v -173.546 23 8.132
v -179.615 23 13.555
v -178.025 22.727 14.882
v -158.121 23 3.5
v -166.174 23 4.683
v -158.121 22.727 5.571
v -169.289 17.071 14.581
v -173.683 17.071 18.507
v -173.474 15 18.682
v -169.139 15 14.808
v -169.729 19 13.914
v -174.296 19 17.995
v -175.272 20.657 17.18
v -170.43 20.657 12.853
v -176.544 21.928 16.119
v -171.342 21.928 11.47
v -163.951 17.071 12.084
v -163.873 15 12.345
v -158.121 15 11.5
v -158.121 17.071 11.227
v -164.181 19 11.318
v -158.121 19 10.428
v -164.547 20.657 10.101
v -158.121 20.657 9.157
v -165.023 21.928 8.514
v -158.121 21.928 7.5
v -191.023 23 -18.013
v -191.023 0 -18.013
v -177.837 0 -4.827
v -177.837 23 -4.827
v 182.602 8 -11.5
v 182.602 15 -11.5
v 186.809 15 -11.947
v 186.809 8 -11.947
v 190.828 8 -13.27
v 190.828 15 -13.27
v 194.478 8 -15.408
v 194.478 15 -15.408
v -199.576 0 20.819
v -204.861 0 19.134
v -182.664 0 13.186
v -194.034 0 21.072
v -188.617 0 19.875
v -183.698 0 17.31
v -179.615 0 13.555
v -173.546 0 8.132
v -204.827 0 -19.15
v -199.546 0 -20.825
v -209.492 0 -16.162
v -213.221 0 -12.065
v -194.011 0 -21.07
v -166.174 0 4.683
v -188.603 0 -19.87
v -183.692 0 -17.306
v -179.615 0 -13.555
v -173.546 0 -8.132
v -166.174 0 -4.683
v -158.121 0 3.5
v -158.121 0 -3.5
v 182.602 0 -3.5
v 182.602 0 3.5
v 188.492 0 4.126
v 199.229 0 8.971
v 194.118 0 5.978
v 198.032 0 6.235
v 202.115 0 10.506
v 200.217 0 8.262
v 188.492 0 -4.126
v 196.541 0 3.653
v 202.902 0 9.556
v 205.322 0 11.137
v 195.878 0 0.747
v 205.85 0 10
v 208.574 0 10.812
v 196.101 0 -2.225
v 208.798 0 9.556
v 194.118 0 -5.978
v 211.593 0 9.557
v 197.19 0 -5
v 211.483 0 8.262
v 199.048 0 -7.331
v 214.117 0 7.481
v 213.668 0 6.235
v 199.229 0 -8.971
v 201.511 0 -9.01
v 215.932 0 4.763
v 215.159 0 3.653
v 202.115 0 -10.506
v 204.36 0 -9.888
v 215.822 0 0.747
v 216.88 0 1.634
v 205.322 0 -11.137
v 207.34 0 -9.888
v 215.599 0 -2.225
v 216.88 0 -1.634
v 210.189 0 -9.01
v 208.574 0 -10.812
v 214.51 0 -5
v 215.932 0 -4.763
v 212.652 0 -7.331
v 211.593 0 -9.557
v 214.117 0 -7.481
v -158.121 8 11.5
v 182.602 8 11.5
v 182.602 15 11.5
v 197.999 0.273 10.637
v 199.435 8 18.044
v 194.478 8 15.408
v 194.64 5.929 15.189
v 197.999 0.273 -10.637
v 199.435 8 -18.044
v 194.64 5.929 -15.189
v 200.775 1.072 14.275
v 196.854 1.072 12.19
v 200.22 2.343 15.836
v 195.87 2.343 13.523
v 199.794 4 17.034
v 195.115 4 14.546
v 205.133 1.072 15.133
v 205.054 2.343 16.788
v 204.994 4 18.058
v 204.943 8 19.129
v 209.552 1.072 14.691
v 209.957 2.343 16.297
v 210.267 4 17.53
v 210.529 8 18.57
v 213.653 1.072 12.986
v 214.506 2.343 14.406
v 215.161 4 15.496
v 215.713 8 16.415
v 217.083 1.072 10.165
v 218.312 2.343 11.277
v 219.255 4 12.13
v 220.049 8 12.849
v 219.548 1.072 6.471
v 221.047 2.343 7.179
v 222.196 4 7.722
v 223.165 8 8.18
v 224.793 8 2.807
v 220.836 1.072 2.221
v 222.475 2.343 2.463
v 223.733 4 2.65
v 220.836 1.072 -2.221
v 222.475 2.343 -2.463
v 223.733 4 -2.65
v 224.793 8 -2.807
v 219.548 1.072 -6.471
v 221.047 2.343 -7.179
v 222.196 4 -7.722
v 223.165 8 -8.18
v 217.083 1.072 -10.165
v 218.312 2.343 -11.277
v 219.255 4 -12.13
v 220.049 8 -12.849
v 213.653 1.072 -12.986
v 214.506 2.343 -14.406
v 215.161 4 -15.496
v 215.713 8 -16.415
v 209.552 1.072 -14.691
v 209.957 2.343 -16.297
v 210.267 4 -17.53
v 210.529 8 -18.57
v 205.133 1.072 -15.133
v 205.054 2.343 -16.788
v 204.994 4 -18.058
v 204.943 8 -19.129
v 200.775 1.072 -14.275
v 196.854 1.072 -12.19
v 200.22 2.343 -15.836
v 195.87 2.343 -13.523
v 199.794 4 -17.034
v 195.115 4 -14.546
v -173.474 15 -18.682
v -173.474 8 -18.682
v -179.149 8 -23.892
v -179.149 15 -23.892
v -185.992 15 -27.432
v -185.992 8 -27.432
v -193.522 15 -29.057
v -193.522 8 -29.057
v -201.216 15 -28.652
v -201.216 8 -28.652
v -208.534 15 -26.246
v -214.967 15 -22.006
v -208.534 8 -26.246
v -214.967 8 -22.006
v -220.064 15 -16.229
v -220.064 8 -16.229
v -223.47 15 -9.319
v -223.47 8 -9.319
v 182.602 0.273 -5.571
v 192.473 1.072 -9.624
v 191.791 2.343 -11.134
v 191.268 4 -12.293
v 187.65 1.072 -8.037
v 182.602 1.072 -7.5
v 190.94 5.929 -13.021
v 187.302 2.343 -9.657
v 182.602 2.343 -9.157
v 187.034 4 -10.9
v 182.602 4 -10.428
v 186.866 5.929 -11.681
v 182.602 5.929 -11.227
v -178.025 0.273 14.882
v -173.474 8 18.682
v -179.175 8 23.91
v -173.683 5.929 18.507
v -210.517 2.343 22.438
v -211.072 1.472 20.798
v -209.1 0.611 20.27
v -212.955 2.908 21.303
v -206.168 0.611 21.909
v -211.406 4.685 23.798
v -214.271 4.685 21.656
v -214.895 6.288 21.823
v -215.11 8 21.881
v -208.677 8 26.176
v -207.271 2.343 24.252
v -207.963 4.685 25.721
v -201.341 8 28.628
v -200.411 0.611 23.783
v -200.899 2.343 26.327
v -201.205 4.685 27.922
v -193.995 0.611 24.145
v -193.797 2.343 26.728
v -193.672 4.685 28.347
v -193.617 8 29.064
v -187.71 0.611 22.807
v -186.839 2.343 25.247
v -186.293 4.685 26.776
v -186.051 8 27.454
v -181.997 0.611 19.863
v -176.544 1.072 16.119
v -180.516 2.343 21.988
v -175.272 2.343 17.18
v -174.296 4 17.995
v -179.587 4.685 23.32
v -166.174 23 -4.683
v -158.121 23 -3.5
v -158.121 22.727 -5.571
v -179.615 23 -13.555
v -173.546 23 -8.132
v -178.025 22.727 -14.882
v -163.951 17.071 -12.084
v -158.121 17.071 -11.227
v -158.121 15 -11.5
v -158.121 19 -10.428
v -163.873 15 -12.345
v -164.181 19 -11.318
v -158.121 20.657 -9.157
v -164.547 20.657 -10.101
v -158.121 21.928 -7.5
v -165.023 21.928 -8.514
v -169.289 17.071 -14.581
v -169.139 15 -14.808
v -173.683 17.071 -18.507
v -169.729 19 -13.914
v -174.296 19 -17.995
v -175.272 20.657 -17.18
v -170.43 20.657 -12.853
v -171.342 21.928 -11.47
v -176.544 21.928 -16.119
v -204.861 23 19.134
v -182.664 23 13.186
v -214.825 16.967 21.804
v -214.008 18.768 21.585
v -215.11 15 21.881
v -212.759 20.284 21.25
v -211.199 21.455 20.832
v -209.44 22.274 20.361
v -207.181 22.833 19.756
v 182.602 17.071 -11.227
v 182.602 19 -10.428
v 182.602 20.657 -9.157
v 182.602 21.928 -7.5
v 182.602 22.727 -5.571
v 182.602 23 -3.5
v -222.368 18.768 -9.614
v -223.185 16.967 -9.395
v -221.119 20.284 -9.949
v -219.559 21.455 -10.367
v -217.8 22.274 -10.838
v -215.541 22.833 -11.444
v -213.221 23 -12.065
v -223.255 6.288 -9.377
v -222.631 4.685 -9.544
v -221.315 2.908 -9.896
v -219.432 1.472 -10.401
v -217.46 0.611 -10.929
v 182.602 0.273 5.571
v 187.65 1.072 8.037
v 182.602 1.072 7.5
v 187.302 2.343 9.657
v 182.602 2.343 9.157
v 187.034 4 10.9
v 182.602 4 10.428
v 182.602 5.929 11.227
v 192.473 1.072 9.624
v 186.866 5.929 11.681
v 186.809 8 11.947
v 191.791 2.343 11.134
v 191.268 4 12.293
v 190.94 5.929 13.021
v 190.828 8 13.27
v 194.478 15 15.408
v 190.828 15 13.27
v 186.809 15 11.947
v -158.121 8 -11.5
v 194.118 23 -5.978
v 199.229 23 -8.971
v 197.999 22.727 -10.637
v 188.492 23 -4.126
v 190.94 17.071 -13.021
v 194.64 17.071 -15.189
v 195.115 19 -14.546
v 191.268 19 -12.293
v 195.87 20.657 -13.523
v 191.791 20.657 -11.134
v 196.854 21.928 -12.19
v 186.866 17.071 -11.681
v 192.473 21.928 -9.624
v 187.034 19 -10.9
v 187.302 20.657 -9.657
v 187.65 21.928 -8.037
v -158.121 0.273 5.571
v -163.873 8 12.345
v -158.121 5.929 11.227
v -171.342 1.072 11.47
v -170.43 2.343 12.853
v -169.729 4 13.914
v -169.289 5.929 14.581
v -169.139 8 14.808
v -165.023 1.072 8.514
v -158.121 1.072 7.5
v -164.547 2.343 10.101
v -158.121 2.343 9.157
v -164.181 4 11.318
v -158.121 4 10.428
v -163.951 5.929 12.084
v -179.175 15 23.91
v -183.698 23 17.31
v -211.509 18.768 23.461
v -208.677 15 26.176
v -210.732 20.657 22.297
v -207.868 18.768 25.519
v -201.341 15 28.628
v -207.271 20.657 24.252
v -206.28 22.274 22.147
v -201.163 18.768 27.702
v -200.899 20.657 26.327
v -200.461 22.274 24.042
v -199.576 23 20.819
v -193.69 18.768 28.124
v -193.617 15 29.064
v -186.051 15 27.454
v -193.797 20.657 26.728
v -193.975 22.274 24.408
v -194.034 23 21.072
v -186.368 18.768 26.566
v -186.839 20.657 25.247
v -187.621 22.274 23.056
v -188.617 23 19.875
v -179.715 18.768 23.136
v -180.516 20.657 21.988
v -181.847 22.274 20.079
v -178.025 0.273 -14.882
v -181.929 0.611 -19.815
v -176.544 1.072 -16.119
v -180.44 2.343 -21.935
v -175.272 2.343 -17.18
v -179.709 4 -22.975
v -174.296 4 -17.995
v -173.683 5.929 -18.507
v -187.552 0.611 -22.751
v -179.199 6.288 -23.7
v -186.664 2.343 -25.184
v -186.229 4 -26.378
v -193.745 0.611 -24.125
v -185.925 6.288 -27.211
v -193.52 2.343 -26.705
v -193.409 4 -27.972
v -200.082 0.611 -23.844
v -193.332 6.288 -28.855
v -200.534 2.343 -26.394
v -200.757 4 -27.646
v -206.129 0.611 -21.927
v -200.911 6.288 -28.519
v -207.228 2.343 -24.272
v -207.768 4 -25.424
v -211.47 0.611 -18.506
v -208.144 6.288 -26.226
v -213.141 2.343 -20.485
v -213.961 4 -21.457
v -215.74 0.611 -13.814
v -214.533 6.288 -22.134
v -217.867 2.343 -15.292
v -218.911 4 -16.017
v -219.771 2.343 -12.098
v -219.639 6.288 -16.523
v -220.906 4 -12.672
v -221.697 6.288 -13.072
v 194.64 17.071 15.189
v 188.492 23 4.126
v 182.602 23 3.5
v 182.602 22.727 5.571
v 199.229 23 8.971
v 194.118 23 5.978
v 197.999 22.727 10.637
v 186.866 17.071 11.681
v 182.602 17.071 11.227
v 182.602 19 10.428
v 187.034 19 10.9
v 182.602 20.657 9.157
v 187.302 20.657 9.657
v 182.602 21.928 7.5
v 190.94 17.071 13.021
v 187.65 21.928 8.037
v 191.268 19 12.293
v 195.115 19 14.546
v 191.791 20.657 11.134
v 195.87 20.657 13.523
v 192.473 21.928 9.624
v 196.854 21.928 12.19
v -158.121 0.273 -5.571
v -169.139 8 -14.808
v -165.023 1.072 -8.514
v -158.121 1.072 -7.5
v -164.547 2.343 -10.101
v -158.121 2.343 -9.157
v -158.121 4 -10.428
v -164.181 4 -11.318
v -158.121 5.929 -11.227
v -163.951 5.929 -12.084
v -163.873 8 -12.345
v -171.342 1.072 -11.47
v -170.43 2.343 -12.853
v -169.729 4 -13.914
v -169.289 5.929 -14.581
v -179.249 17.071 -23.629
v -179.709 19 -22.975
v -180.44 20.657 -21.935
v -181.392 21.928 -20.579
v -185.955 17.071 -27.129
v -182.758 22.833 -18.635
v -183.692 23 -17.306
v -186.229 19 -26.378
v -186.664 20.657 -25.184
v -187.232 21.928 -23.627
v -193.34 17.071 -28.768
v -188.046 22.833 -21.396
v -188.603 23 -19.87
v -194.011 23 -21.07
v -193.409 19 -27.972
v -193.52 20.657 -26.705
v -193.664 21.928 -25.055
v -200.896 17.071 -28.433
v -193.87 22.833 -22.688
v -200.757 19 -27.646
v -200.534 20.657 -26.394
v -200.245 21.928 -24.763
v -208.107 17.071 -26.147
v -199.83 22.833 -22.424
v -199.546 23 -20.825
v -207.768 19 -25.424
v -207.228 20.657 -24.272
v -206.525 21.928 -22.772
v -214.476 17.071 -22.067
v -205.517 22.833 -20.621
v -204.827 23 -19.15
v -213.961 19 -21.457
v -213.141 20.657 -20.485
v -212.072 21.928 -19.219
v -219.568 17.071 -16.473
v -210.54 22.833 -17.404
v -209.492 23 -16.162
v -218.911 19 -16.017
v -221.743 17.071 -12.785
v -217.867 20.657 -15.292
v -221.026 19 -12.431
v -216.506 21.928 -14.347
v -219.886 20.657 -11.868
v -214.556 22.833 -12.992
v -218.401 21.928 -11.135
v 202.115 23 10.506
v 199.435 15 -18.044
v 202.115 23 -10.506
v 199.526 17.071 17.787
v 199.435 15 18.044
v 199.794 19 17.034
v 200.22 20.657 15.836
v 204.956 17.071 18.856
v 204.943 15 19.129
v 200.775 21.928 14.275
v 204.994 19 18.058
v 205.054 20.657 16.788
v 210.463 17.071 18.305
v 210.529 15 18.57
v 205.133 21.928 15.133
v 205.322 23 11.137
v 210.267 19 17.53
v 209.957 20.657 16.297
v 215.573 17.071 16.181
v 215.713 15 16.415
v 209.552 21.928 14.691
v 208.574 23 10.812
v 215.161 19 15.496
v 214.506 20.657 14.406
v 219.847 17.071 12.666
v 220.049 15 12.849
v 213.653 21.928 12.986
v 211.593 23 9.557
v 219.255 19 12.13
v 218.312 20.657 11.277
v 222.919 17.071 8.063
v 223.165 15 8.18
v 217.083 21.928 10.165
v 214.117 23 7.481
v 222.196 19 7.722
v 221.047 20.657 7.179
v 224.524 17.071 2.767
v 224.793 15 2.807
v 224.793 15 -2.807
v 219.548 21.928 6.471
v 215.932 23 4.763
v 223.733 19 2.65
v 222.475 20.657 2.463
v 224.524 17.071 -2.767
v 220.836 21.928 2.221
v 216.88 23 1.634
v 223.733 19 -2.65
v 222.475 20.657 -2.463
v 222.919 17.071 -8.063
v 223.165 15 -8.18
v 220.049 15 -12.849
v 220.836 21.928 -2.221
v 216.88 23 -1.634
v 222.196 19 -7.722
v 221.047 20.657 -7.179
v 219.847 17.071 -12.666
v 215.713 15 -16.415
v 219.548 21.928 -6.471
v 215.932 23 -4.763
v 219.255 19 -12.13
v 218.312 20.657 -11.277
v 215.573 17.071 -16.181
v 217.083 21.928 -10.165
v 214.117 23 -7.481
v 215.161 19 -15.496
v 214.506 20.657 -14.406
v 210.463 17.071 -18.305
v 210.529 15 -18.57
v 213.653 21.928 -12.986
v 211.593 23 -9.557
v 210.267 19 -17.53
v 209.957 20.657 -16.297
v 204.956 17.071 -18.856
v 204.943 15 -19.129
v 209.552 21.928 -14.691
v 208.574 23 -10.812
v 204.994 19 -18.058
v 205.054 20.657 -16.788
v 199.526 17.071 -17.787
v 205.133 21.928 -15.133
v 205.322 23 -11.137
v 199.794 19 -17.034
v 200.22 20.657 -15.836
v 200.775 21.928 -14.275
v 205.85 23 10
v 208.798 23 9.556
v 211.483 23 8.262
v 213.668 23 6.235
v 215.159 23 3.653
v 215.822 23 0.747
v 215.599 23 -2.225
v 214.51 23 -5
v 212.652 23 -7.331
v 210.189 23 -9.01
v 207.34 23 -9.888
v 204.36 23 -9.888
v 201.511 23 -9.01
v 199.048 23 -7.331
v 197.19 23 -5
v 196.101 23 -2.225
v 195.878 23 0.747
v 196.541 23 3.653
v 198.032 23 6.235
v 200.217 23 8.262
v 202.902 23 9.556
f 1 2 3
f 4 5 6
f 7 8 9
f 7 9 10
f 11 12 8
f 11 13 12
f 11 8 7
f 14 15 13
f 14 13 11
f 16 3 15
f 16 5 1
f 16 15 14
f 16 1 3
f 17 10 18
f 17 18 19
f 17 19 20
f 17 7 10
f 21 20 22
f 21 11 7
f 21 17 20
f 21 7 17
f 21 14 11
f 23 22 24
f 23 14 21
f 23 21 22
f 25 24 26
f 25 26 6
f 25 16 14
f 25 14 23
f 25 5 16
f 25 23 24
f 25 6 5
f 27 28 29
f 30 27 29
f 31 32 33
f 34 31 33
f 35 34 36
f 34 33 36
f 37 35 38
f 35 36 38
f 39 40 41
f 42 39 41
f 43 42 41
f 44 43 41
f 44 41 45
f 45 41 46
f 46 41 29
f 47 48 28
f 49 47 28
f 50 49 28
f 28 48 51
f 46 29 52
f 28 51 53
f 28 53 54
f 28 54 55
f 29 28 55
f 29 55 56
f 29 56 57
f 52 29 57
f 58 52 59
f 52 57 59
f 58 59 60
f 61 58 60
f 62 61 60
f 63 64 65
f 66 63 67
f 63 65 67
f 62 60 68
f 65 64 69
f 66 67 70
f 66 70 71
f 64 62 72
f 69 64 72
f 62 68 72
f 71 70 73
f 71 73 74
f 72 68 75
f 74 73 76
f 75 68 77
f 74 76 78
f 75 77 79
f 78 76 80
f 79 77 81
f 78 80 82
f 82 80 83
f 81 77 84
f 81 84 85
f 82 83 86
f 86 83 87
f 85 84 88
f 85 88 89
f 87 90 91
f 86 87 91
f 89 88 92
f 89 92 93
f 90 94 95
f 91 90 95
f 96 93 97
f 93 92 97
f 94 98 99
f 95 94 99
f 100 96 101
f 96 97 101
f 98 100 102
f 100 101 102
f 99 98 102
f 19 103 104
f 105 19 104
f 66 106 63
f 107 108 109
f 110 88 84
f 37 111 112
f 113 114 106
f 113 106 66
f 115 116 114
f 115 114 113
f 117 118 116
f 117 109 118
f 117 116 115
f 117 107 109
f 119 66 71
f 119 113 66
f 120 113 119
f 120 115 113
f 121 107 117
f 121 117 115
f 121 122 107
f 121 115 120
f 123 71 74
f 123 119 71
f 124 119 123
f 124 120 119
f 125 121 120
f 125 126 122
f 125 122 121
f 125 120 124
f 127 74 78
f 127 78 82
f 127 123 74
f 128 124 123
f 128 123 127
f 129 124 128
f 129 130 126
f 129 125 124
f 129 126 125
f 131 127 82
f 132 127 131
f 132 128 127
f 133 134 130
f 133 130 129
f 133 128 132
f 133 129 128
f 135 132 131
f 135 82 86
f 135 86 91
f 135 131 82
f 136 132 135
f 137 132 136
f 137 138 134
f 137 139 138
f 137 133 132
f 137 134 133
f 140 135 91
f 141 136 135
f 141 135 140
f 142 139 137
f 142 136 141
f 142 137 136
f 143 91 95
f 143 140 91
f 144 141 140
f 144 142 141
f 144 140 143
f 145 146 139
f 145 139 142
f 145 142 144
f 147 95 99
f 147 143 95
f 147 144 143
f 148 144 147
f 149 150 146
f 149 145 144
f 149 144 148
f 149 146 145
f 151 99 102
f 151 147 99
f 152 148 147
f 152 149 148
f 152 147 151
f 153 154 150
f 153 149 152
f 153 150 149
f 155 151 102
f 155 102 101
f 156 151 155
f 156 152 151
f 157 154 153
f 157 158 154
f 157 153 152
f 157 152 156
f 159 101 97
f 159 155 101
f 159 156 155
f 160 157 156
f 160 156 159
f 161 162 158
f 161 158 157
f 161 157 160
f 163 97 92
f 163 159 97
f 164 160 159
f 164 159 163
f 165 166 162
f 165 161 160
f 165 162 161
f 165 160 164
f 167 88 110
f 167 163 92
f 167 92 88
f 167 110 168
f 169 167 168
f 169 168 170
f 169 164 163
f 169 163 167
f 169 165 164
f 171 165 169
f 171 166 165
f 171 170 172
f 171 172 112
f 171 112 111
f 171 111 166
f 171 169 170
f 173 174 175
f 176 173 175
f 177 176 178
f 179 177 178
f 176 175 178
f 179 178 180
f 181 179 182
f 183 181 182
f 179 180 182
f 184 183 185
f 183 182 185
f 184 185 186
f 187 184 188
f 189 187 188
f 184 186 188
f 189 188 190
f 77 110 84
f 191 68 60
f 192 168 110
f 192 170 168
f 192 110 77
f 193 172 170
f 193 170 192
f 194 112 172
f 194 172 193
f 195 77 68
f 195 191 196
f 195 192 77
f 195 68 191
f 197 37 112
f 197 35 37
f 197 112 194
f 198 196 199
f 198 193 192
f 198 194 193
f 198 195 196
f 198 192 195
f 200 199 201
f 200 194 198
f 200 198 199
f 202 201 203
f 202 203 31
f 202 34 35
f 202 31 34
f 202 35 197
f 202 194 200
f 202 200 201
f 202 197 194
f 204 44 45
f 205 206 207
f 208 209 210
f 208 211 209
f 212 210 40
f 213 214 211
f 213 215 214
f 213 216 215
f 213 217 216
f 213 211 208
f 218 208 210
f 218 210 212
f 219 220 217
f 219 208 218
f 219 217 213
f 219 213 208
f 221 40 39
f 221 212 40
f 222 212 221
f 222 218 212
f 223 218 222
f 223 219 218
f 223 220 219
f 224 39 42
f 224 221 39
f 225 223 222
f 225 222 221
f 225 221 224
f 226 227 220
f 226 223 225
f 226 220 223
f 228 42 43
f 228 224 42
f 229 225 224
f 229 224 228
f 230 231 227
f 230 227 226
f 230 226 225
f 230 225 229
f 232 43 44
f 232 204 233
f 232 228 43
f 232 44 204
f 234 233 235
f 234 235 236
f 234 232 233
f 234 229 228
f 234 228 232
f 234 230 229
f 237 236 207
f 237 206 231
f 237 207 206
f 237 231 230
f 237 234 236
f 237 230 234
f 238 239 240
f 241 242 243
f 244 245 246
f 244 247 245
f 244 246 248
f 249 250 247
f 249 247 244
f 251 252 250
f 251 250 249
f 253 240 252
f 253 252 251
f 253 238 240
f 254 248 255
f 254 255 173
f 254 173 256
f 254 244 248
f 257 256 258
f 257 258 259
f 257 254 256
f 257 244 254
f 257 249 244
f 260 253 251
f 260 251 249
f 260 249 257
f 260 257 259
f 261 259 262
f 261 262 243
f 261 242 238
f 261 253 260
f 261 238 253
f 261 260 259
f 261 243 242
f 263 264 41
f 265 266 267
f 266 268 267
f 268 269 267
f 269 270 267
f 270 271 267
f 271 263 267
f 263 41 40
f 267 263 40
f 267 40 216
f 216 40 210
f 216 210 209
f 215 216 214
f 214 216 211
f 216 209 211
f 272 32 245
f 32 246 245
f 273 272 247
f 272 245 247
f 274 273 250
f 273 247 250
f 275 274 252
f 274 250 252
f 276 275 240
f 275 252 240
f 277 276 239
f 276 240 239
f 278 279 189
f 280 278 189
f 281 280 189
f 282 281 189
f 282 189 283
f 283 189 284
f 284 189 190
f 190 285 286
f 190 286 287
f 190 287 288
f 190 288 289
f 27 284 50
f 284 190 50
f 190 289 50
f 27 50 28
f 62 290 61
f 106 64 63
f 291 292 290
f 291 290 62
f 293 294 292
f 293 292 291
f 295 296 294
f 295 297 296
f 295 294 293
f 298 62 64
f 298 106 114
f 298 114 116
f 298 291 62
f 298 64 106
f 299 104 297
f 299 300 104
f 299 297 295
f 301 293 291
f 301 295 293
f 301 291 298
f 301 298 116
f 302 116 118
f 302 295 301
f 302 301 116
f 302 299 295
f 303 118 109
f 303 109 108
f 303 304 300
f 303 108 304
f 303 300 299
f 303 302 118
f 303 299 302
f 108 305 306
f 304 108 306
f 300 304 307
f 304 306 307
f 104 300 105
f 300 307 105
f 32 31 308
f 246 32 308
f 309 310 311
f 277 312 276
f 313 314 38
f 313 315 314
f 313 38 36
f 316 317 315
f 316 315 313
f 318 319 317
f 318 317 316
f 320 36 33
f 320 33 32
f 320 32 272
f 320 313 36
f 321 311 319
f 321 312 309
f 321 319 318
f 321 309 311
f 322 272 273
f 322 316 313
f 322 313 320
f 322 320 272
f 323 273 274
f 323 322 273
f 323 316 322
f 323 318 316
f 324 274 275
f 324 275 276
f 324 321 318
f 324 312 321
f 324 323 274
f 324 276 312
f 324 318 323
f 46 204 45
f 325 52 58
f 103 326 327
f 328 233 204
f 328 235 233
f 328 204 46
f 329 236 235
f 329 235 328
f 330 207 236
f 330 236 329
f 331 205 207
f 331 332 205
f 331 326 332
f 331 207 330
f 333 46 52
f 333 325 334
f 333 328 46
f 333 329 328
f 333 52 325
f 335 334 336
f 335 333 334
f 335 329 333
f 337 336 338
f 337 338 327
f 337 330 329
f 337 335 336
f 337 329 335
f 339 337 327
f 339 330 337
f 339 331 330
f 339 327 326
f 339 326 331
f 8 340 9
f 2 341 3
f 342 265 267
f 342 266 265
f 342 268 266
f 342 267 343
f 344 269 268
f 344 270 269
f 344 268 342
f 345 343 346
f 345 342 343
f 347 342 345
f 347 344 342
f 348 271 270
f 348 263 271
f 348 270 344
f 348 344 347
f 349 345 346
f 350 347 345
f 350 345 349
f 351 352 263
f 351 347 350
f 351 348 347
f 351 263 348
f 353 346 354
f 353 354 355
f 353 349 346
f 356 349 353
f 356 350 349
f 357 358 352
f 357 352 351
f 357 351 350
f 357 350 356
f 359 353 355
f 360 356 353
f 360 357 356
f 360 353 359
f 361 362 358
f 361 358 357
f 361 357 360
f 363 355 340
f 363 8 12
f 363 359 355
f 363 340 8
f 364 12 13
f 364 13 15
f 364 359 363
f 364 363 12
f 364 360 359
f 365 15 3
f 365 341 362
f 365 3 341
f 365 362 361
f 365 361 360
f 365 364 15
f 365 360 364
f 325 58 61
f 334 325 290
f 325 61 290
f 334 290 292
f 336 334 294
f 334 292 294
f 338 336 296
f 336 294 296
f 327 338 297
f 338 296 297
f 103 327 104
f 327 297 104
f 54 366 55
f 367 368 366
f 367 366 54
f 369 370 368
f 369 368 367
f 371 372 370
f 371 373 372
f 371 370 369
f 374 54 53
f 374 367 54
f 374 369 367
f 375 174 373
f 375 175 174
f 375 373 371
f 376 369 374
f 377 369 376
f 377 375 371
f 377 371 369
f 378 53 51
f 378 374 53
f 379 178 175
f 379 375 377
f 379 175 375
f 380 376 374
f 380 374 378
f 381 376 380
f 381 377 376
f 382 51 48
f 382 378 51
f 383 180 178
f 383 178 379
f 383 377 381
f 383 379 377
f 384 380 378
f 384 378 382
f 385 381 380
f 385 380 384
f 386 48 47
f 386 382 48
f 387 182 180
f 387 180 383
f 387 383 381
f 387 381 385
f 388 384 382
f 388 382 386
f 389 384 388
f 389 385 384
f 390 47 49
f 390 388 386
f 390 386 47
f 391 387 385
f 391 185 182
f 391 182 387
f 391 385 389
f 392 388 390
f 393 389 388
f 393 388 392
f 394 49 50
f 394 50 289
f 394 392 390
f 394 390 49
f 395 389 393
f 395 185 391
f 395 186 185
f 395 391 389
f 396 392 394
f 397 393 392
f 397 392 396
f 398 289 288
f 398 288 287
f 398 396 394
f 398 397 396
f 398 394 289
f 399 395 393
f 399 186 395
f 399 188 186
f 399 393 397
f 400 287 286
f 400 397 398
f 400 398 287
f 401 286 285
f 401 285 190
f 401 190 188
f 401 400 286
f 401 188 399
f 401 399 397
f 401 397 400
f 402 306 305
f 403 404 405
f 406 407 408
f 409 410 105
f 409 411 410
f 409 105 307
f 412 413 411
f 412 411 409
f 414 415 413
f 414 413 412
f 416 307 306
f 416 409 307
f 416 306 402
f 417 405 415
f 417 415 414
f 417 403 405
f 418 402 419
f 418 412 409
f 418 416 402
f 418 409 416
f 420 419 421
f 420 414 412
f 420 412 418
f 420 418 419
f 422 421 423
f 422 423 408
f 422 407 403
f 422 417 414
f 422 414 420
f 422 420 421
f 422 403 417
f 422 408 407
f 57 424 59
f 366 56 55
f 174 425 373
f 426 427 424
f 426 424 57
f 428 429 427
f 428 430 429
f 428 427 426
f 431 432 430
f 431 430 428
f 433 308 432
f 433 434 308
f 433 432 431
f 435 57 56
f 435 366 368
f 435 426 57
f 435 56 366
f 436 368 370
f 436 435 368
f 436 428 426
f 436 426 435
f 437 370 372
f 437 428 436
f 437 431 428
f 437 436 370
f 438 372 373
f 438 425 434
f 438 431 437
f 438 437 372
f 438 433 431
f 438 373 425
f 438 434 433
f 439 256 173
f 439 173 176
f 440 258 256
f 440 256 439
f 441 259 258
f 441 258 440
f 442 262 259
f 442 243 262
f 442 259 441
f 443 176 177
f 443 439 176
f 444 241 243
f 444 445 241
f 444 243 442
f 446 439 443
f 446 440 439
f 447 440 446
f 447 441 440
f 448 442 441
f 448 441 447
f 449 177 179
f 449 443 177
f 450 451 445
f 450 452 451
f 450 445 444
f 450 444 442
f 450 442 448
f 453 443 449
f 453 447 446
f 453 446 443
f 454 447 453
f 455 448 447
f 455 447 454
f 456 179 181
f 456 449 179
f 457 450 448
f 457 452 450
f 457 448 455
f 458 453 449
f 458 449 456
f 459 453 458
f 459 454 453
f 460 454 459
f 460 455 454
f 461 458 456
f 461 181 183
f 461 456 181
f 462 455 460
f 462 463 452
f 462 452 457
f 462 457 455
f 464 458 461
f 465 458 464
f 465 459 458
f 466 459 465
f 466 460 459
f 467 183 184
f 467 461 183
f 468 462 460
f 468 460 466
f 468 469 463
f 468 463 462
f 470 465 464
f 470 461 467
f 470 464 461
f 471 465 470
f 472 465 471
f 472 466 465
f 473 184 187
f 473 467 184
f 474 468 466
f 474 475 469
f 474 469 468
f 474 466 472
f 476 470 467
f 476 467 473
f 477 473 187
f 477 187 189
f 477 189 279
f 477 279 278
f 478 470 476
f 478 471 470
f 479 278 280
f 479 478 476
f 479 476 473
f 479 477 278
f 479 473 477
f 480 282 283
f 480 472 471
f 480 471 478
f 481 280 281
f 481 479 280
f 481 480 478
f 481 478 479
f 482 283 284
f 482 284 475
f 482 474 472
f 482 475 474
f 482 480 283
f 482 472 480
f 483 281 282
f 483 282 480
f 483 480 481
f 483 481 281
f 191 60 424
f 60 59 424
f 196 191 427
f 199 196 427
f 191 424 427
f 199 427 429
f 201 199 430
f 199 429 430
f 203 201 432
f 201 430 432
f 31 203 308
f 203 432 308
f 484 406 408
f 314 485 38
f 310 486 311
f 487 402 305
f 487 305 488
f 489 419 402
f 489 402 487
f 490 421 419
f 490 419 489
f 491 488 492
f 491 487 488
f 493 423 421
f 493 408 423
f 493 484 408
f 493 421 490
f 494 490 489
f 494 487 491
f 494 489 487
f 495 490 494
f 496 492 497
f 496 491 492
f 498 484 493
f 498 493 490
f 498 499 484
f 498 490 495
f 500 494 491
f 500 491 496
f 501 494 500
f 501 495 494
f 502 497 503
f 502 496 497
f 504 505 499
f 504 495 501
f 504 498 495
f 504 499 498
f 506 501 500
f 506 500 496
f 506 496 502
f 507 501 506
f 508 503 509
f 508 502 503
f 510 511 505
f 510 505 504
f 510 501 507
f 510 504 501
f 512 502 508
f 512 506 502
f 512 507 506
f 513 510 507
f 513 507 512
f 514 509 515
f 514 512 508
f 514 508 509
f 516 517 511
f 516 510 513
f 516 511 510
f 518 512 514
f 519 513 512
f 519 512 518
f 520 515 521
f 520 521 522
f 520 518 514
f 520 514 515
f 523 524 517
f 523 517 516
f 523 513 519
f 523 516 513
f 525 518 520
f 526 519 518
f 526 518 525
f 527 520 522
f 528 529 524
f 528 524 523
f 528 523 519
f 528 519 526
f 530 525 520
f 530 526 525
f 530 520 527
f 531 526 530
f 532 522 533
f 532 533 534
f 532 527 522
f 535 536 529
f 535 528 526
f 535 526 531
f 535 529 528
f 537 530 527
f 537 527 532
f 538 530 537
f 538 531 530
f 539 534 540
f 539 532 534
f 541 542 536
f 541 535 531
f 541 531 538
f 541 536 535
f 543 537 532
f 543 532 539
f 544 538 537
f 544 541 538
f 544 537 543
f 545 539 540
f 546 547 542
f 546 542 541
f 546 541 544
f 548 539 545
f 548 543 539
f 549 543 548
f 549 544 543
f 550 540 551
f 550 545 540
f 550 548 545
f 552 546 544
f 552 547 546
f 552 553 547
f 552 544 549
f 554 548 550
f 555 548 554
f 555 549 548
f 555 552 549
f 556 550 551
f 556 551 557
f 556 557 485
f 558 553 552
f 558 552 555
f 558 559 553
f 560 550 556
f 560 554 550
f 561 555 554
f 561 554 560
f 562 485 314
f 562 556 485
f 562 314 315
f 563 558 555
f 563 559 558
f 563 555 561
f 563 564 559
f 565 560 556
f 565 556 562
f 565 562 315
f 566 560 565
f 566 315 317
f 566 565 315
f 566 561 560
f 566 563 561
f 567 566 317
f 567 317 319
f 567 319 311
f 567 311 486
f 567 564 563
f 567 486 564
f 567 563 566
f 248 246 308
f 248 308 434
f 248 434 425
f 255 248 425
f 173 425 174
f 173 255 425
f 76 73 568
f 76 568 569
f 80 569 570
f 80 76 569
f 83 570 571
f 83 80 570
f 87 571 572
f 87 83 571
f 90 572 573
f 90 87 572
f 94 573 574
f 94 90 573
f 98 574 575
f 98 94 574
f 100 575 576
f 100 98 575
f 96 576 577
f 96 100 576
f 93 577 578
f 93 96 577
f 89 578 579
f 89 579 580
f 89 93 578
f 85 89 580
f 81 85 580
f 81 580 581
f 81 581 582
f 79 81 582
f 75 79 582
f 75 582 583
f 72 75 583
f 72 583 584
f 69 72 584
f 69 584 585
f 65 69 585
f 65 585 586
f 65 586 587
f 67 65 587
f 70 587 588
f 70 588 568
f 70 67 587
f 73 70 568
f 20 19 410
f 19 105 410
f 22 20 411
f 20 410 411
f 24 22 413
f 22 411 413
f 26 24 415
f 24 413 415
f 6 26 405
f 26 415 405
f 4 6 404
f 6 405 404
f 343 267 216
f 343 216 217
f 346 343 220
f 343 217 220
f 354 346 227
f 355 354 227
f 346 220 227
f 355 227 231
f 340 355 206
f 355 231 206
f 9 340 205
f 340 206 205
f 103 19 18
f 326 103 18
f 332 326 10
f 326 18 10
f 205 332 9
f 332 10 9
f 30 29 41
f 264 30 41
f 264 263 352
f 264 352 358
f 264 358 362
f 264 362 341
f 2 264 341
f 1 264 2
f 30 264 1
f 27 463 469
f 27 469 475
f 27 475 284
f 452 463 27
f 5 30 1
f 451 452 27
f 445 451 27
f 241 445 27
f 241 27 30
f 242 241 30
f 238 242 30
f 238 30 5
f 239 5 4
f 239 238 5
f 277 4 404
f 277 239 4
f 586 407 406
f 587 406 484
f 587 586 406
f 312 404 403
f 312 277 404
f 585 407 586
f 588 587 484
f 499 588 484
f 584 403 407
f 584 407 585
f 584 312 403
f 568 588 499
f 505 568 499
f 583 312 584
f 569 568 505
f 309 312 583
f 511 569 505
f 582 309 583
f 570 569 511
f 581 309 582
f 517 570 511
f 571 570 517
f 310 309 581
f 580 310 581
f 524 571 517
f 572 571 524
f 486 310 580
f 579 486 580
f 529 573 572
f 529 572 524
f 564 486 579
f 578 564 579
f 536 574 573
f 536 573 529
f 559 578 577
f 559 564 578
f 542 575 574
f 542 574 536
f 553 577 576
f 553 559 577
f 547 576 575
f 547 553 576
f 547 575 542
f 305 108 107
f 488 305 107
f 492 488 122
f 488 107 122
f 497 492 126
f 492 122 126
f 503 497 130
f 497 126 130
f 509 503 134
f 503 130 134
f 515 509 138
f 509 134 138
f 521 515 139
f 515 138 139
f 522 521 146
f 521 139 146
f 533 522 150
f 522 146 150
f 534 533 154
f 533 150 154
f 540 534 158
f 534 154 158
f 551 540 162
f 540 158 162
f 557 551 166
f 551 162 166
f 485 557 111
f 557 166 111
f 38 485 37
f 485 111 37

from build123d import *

# Parameters (mm, degrees)
SKETCH1_R           = 10.000000000000009
BOSS_EXTRUDE1_DEPTH = 23
FILLET1_R           = 20
FILLET2_R           = 8


with BuildPart() as part:
    # Sketch1 → Boss-Extrude1 (new body)
    # profile 1 of 8: a face of its own
    with BuildSketch(Plane(origin=(0, 0, 0), x_dir=(1, 0, 0), z_dir=(0, 1, 0))):
        with BuildLine():
            Line((190.53750510204208, 11.499999999999996), (-169.0643228571688, 11.499999999999996))
            ThreePointArc((-169.06432285716886, 11.499999999999785), (-167.29719813473903, 5.8702645292353655), (-166.699999999998, -5.84695e-12))
            ThreePointArc((-166.699999999998, -5.85409e-12), (-167.29719813473773, -5.870264529240628), (-169.0643228571637, -11.499999999999407))
            Line((-169.0643228571635, -11.499999999999996), (190.53750510204208, -11.499999999999996))
            ThreePointArc((190.53750510204202, -11.500000000000126), (186.70000000000027, 2.35e-15), (190.53750510204205, 11.500000000000131))
        make_face()
    # profile 2 of 8: a face of its own
    with BuildSketch(Plane(origin=(0, 0, 0), x_dir=(1, 0, 0), z_dir=(0, 1, 0))):
        with BuildLine():
            Line((-209.0364197819809, 13.186419781973054), (-191.02343537482668, 18.01298440714431))
            Line((-191.02343537482668, 18.01298440714431), (-184.51045096768246, 11.499999999999996))
            Line((-184.51045096768246, 11.499999999999996), (-169.0643228571688, 11.499999999999996))
            ThreePointArc((-169.06432285716886, 11.499999999999785), (-195.8499999999993, 29.149999999995877), (-222.63567714283025, 11.500000000000531))
            Line((-222.63567714283008, 11.499999999999996), (-215.33022409119366, 11.499999999999996))
            Line((-215.33022409119366, 11.500000000000018), (-209.0364197819809, 13.186419781973054))
        make_face()
    # profile 3 of 8: a face of its own
    with BuildSketch(Plane(origin=(0, 0, 0), x_dir=(1, 0, 0), z_dir=(0, 1, 0))):
        with BuildLine():
            Line((-169.0643228571688, 11.499999999999996), (-184.51045096768246, 11.499999999999996))
            Line((-184.51045096768246, 11.499999999999996), (-177.83701559284398, 4.826564625161424))
            Line((-177.83701559284398, 4.826564625161426), (-182.21170539933064, -11.499999999999996))
            Line((-182.21170539933064, -11.499999999999996), (-169.0643228571635, -11.499999999999996))
            ThreePointArc((-169.0643228571637, -11.499999999999407), (-167.29719813473773, -5.870264529240628), (-166.699999999998, -5.85409e-12))
            ThreePointArc((-166.699999999998, -5.84695e-12), (-167.29719813473903, 5.8702645292353655), (-169.06432285716886, 11.499999999999785))
        make_face()
    # profile 4 of 8: a face of its own
    with BuildSketch(Plane(origin=(0, 0, 0), x_dir=(1, 0, 0), z_dir=(0, 1, 0))):
        with BuildLine():
            Line((-169.0643228571635, -11.499999999999996), (-182.21170539933064, -11.499999999999996))
            Line((-182.21170539933064, -11.499999999999996), (-182.66358021801545, -13.186419781992653))
            Line((-182.66358021801545, -13.186419781992653), (-200.67656462516962, -18.012984407163884))
            Line((-200.67656462516962, -18.012984407163888), (-215.11044742166933, -21.880531646131363))
            ThreePointArc((-215.11044742167047, -21.88053164613265), (-189.43937367309758, -28.43635648421335), (-169.0643228571637, -11.499999999999407))
        make_face()
    # profile 5 of 8: a face of its own
    with BuildSketch(Plane(origin=(0, 0, 0), x_dir=(1, 0, 0), z_dir=(0, 1, 0))):
        with BuildLine():
            Line((221.162494897959, 11.499999999999996), (190.53750510204208, 11.499999999999996))
            ThreePointArc((190.53750510204205, 11.500000000000131), (186.70000000000027, 2.35e-15), (190.53750510204202, -11.500000000000126))
            Line((190.53750510204208, -11.499999999999996), (221.162494897959, -11.499999999999996))
            ThreePointArc((221.16249489795885, -11.499999999999684), (224.0153072819582, -6.061692119536153), (225.00000000000028, -4.69e-15))
            ThreePointArc((225.00000000000028, 0), (224.0153072819582, 6.061692119536143), (221.16249489795888, 11.49999999999967))
        make_face()
        with Locations(Location((205.85000000000028, 0, 0), (0, 0, 270))):
            Circle(SKETCH1_R, mode=Mode.SUBTRACT)
    # profile 6 of 8: a face of its own
    with BuildSketch(Plane(origin=(0, 0, 0), x_dir=(1, 0, 0), z_dir=(0, 1, 0))):
        with BuildLine():
            Line((221.162494897959, -11.499999999999996), (190.53750510204208, -11.499999999999996))
            ThreePointArc((190.53750510204202, -11.500000000000126), (205.85000000000053, -19.150000000000006), (221.16249489795885, -11.499999999999684))
        make_face()
    # profile 7 of 8: a face of its own
    with BuildSketch(Plane(origin=(0, 0, 0), x_dir=(1, 0, 0), z_dir=(0, 1, 0))):
        with BuildLine():
            ThreePointArc((221.16249489795888, 11.49999999999967), (205.85000000000056, 19.150000000000006), (190.53750510204205, 11.500000000000131))
            Line((190.53750510204208, 11.499999999999996), (221.162494897959, 11.499999999999996))
        make_face()
    # profile 8 of 8: a face of its own
    with BuildSketch(Plane(origin=(0, 0, 0), x_dir=(1, 0, 0), z_dir=(0, 1, 0))):
        with BuildLine():
            Line((-223.47030257848598, 9.31887254300414), (-215.33022409119366, 11.500000000000018))
            Line((-215.33022409119366, 11.499999999999996), (-222.63567714283008, 11.499999999999996))
            ThreePointArc((-222.63567714283025, 11.500000000000519), (-223.0748413513289, 10.417797914863556), (-223.4703025784876, 9.318872543004696))
        make_face()
    extrude(amount=BOSS_EXTRUDE1_DEPTH)

    # Fillet1
    fillet1_edges = [part.edges().sort_by_distance(p)[0] for p in [
        (-169.06432285716357, 11.5, 11.499999999999702),
        (-169.06432285716883, 11.5, -11.499999999999892),
        (190.53750510204208, 11.5, -11.500000000000068),
        (190.53750510204205, 11.5, 11.500000000000059),
    ]]
    fillet(fillet1_edges, radius=FILLET1_R)

    # Fillet2
    fillet2_edges = [part.edges().sort_by_distance(p)[0] for p in [
        (-193.61734753029688, 0, 29.06437274310201),
        (225.00000000000028, 0, -2.576e-14),
        (225.0000000000003, 23, -4.174e-14),
        (12.240435042127586, 0, 11.499999999999766),
        (12.240435042127586, 23, 11.499999999999766),
        (12.24043504212267, 0, -11.499999999999865),
        (12.240435042122641, 23, -11.499999999999865),
        (-201.21583651826683, 0, -28.651881237695218),
        (-201.21583651826677, 23, -28.651881237695314),
        (188.85337218093906, 0, 12.50211748036416),
        (-193.61734753029688, 23, 29.06437274310201),
        (188.85337218093903, 23, 12.502117480364152),
        (188.85337218093898, 0, -12.502117480364163),
        (188.85337218093898, 23, -12.502117480364163),
        (-166.59579003361372, 0, -13.384287379634728),
        (-166.59579003361372, 23, -13.384287379634728),
        (-166.5957900336068, 0, 13.384287379636046),
        (-166.5957900336068, 23, 13.384287379636042),
    ]]
    fillet(fillet2_edges, radius=FILLET2_R)


solid = part.part
